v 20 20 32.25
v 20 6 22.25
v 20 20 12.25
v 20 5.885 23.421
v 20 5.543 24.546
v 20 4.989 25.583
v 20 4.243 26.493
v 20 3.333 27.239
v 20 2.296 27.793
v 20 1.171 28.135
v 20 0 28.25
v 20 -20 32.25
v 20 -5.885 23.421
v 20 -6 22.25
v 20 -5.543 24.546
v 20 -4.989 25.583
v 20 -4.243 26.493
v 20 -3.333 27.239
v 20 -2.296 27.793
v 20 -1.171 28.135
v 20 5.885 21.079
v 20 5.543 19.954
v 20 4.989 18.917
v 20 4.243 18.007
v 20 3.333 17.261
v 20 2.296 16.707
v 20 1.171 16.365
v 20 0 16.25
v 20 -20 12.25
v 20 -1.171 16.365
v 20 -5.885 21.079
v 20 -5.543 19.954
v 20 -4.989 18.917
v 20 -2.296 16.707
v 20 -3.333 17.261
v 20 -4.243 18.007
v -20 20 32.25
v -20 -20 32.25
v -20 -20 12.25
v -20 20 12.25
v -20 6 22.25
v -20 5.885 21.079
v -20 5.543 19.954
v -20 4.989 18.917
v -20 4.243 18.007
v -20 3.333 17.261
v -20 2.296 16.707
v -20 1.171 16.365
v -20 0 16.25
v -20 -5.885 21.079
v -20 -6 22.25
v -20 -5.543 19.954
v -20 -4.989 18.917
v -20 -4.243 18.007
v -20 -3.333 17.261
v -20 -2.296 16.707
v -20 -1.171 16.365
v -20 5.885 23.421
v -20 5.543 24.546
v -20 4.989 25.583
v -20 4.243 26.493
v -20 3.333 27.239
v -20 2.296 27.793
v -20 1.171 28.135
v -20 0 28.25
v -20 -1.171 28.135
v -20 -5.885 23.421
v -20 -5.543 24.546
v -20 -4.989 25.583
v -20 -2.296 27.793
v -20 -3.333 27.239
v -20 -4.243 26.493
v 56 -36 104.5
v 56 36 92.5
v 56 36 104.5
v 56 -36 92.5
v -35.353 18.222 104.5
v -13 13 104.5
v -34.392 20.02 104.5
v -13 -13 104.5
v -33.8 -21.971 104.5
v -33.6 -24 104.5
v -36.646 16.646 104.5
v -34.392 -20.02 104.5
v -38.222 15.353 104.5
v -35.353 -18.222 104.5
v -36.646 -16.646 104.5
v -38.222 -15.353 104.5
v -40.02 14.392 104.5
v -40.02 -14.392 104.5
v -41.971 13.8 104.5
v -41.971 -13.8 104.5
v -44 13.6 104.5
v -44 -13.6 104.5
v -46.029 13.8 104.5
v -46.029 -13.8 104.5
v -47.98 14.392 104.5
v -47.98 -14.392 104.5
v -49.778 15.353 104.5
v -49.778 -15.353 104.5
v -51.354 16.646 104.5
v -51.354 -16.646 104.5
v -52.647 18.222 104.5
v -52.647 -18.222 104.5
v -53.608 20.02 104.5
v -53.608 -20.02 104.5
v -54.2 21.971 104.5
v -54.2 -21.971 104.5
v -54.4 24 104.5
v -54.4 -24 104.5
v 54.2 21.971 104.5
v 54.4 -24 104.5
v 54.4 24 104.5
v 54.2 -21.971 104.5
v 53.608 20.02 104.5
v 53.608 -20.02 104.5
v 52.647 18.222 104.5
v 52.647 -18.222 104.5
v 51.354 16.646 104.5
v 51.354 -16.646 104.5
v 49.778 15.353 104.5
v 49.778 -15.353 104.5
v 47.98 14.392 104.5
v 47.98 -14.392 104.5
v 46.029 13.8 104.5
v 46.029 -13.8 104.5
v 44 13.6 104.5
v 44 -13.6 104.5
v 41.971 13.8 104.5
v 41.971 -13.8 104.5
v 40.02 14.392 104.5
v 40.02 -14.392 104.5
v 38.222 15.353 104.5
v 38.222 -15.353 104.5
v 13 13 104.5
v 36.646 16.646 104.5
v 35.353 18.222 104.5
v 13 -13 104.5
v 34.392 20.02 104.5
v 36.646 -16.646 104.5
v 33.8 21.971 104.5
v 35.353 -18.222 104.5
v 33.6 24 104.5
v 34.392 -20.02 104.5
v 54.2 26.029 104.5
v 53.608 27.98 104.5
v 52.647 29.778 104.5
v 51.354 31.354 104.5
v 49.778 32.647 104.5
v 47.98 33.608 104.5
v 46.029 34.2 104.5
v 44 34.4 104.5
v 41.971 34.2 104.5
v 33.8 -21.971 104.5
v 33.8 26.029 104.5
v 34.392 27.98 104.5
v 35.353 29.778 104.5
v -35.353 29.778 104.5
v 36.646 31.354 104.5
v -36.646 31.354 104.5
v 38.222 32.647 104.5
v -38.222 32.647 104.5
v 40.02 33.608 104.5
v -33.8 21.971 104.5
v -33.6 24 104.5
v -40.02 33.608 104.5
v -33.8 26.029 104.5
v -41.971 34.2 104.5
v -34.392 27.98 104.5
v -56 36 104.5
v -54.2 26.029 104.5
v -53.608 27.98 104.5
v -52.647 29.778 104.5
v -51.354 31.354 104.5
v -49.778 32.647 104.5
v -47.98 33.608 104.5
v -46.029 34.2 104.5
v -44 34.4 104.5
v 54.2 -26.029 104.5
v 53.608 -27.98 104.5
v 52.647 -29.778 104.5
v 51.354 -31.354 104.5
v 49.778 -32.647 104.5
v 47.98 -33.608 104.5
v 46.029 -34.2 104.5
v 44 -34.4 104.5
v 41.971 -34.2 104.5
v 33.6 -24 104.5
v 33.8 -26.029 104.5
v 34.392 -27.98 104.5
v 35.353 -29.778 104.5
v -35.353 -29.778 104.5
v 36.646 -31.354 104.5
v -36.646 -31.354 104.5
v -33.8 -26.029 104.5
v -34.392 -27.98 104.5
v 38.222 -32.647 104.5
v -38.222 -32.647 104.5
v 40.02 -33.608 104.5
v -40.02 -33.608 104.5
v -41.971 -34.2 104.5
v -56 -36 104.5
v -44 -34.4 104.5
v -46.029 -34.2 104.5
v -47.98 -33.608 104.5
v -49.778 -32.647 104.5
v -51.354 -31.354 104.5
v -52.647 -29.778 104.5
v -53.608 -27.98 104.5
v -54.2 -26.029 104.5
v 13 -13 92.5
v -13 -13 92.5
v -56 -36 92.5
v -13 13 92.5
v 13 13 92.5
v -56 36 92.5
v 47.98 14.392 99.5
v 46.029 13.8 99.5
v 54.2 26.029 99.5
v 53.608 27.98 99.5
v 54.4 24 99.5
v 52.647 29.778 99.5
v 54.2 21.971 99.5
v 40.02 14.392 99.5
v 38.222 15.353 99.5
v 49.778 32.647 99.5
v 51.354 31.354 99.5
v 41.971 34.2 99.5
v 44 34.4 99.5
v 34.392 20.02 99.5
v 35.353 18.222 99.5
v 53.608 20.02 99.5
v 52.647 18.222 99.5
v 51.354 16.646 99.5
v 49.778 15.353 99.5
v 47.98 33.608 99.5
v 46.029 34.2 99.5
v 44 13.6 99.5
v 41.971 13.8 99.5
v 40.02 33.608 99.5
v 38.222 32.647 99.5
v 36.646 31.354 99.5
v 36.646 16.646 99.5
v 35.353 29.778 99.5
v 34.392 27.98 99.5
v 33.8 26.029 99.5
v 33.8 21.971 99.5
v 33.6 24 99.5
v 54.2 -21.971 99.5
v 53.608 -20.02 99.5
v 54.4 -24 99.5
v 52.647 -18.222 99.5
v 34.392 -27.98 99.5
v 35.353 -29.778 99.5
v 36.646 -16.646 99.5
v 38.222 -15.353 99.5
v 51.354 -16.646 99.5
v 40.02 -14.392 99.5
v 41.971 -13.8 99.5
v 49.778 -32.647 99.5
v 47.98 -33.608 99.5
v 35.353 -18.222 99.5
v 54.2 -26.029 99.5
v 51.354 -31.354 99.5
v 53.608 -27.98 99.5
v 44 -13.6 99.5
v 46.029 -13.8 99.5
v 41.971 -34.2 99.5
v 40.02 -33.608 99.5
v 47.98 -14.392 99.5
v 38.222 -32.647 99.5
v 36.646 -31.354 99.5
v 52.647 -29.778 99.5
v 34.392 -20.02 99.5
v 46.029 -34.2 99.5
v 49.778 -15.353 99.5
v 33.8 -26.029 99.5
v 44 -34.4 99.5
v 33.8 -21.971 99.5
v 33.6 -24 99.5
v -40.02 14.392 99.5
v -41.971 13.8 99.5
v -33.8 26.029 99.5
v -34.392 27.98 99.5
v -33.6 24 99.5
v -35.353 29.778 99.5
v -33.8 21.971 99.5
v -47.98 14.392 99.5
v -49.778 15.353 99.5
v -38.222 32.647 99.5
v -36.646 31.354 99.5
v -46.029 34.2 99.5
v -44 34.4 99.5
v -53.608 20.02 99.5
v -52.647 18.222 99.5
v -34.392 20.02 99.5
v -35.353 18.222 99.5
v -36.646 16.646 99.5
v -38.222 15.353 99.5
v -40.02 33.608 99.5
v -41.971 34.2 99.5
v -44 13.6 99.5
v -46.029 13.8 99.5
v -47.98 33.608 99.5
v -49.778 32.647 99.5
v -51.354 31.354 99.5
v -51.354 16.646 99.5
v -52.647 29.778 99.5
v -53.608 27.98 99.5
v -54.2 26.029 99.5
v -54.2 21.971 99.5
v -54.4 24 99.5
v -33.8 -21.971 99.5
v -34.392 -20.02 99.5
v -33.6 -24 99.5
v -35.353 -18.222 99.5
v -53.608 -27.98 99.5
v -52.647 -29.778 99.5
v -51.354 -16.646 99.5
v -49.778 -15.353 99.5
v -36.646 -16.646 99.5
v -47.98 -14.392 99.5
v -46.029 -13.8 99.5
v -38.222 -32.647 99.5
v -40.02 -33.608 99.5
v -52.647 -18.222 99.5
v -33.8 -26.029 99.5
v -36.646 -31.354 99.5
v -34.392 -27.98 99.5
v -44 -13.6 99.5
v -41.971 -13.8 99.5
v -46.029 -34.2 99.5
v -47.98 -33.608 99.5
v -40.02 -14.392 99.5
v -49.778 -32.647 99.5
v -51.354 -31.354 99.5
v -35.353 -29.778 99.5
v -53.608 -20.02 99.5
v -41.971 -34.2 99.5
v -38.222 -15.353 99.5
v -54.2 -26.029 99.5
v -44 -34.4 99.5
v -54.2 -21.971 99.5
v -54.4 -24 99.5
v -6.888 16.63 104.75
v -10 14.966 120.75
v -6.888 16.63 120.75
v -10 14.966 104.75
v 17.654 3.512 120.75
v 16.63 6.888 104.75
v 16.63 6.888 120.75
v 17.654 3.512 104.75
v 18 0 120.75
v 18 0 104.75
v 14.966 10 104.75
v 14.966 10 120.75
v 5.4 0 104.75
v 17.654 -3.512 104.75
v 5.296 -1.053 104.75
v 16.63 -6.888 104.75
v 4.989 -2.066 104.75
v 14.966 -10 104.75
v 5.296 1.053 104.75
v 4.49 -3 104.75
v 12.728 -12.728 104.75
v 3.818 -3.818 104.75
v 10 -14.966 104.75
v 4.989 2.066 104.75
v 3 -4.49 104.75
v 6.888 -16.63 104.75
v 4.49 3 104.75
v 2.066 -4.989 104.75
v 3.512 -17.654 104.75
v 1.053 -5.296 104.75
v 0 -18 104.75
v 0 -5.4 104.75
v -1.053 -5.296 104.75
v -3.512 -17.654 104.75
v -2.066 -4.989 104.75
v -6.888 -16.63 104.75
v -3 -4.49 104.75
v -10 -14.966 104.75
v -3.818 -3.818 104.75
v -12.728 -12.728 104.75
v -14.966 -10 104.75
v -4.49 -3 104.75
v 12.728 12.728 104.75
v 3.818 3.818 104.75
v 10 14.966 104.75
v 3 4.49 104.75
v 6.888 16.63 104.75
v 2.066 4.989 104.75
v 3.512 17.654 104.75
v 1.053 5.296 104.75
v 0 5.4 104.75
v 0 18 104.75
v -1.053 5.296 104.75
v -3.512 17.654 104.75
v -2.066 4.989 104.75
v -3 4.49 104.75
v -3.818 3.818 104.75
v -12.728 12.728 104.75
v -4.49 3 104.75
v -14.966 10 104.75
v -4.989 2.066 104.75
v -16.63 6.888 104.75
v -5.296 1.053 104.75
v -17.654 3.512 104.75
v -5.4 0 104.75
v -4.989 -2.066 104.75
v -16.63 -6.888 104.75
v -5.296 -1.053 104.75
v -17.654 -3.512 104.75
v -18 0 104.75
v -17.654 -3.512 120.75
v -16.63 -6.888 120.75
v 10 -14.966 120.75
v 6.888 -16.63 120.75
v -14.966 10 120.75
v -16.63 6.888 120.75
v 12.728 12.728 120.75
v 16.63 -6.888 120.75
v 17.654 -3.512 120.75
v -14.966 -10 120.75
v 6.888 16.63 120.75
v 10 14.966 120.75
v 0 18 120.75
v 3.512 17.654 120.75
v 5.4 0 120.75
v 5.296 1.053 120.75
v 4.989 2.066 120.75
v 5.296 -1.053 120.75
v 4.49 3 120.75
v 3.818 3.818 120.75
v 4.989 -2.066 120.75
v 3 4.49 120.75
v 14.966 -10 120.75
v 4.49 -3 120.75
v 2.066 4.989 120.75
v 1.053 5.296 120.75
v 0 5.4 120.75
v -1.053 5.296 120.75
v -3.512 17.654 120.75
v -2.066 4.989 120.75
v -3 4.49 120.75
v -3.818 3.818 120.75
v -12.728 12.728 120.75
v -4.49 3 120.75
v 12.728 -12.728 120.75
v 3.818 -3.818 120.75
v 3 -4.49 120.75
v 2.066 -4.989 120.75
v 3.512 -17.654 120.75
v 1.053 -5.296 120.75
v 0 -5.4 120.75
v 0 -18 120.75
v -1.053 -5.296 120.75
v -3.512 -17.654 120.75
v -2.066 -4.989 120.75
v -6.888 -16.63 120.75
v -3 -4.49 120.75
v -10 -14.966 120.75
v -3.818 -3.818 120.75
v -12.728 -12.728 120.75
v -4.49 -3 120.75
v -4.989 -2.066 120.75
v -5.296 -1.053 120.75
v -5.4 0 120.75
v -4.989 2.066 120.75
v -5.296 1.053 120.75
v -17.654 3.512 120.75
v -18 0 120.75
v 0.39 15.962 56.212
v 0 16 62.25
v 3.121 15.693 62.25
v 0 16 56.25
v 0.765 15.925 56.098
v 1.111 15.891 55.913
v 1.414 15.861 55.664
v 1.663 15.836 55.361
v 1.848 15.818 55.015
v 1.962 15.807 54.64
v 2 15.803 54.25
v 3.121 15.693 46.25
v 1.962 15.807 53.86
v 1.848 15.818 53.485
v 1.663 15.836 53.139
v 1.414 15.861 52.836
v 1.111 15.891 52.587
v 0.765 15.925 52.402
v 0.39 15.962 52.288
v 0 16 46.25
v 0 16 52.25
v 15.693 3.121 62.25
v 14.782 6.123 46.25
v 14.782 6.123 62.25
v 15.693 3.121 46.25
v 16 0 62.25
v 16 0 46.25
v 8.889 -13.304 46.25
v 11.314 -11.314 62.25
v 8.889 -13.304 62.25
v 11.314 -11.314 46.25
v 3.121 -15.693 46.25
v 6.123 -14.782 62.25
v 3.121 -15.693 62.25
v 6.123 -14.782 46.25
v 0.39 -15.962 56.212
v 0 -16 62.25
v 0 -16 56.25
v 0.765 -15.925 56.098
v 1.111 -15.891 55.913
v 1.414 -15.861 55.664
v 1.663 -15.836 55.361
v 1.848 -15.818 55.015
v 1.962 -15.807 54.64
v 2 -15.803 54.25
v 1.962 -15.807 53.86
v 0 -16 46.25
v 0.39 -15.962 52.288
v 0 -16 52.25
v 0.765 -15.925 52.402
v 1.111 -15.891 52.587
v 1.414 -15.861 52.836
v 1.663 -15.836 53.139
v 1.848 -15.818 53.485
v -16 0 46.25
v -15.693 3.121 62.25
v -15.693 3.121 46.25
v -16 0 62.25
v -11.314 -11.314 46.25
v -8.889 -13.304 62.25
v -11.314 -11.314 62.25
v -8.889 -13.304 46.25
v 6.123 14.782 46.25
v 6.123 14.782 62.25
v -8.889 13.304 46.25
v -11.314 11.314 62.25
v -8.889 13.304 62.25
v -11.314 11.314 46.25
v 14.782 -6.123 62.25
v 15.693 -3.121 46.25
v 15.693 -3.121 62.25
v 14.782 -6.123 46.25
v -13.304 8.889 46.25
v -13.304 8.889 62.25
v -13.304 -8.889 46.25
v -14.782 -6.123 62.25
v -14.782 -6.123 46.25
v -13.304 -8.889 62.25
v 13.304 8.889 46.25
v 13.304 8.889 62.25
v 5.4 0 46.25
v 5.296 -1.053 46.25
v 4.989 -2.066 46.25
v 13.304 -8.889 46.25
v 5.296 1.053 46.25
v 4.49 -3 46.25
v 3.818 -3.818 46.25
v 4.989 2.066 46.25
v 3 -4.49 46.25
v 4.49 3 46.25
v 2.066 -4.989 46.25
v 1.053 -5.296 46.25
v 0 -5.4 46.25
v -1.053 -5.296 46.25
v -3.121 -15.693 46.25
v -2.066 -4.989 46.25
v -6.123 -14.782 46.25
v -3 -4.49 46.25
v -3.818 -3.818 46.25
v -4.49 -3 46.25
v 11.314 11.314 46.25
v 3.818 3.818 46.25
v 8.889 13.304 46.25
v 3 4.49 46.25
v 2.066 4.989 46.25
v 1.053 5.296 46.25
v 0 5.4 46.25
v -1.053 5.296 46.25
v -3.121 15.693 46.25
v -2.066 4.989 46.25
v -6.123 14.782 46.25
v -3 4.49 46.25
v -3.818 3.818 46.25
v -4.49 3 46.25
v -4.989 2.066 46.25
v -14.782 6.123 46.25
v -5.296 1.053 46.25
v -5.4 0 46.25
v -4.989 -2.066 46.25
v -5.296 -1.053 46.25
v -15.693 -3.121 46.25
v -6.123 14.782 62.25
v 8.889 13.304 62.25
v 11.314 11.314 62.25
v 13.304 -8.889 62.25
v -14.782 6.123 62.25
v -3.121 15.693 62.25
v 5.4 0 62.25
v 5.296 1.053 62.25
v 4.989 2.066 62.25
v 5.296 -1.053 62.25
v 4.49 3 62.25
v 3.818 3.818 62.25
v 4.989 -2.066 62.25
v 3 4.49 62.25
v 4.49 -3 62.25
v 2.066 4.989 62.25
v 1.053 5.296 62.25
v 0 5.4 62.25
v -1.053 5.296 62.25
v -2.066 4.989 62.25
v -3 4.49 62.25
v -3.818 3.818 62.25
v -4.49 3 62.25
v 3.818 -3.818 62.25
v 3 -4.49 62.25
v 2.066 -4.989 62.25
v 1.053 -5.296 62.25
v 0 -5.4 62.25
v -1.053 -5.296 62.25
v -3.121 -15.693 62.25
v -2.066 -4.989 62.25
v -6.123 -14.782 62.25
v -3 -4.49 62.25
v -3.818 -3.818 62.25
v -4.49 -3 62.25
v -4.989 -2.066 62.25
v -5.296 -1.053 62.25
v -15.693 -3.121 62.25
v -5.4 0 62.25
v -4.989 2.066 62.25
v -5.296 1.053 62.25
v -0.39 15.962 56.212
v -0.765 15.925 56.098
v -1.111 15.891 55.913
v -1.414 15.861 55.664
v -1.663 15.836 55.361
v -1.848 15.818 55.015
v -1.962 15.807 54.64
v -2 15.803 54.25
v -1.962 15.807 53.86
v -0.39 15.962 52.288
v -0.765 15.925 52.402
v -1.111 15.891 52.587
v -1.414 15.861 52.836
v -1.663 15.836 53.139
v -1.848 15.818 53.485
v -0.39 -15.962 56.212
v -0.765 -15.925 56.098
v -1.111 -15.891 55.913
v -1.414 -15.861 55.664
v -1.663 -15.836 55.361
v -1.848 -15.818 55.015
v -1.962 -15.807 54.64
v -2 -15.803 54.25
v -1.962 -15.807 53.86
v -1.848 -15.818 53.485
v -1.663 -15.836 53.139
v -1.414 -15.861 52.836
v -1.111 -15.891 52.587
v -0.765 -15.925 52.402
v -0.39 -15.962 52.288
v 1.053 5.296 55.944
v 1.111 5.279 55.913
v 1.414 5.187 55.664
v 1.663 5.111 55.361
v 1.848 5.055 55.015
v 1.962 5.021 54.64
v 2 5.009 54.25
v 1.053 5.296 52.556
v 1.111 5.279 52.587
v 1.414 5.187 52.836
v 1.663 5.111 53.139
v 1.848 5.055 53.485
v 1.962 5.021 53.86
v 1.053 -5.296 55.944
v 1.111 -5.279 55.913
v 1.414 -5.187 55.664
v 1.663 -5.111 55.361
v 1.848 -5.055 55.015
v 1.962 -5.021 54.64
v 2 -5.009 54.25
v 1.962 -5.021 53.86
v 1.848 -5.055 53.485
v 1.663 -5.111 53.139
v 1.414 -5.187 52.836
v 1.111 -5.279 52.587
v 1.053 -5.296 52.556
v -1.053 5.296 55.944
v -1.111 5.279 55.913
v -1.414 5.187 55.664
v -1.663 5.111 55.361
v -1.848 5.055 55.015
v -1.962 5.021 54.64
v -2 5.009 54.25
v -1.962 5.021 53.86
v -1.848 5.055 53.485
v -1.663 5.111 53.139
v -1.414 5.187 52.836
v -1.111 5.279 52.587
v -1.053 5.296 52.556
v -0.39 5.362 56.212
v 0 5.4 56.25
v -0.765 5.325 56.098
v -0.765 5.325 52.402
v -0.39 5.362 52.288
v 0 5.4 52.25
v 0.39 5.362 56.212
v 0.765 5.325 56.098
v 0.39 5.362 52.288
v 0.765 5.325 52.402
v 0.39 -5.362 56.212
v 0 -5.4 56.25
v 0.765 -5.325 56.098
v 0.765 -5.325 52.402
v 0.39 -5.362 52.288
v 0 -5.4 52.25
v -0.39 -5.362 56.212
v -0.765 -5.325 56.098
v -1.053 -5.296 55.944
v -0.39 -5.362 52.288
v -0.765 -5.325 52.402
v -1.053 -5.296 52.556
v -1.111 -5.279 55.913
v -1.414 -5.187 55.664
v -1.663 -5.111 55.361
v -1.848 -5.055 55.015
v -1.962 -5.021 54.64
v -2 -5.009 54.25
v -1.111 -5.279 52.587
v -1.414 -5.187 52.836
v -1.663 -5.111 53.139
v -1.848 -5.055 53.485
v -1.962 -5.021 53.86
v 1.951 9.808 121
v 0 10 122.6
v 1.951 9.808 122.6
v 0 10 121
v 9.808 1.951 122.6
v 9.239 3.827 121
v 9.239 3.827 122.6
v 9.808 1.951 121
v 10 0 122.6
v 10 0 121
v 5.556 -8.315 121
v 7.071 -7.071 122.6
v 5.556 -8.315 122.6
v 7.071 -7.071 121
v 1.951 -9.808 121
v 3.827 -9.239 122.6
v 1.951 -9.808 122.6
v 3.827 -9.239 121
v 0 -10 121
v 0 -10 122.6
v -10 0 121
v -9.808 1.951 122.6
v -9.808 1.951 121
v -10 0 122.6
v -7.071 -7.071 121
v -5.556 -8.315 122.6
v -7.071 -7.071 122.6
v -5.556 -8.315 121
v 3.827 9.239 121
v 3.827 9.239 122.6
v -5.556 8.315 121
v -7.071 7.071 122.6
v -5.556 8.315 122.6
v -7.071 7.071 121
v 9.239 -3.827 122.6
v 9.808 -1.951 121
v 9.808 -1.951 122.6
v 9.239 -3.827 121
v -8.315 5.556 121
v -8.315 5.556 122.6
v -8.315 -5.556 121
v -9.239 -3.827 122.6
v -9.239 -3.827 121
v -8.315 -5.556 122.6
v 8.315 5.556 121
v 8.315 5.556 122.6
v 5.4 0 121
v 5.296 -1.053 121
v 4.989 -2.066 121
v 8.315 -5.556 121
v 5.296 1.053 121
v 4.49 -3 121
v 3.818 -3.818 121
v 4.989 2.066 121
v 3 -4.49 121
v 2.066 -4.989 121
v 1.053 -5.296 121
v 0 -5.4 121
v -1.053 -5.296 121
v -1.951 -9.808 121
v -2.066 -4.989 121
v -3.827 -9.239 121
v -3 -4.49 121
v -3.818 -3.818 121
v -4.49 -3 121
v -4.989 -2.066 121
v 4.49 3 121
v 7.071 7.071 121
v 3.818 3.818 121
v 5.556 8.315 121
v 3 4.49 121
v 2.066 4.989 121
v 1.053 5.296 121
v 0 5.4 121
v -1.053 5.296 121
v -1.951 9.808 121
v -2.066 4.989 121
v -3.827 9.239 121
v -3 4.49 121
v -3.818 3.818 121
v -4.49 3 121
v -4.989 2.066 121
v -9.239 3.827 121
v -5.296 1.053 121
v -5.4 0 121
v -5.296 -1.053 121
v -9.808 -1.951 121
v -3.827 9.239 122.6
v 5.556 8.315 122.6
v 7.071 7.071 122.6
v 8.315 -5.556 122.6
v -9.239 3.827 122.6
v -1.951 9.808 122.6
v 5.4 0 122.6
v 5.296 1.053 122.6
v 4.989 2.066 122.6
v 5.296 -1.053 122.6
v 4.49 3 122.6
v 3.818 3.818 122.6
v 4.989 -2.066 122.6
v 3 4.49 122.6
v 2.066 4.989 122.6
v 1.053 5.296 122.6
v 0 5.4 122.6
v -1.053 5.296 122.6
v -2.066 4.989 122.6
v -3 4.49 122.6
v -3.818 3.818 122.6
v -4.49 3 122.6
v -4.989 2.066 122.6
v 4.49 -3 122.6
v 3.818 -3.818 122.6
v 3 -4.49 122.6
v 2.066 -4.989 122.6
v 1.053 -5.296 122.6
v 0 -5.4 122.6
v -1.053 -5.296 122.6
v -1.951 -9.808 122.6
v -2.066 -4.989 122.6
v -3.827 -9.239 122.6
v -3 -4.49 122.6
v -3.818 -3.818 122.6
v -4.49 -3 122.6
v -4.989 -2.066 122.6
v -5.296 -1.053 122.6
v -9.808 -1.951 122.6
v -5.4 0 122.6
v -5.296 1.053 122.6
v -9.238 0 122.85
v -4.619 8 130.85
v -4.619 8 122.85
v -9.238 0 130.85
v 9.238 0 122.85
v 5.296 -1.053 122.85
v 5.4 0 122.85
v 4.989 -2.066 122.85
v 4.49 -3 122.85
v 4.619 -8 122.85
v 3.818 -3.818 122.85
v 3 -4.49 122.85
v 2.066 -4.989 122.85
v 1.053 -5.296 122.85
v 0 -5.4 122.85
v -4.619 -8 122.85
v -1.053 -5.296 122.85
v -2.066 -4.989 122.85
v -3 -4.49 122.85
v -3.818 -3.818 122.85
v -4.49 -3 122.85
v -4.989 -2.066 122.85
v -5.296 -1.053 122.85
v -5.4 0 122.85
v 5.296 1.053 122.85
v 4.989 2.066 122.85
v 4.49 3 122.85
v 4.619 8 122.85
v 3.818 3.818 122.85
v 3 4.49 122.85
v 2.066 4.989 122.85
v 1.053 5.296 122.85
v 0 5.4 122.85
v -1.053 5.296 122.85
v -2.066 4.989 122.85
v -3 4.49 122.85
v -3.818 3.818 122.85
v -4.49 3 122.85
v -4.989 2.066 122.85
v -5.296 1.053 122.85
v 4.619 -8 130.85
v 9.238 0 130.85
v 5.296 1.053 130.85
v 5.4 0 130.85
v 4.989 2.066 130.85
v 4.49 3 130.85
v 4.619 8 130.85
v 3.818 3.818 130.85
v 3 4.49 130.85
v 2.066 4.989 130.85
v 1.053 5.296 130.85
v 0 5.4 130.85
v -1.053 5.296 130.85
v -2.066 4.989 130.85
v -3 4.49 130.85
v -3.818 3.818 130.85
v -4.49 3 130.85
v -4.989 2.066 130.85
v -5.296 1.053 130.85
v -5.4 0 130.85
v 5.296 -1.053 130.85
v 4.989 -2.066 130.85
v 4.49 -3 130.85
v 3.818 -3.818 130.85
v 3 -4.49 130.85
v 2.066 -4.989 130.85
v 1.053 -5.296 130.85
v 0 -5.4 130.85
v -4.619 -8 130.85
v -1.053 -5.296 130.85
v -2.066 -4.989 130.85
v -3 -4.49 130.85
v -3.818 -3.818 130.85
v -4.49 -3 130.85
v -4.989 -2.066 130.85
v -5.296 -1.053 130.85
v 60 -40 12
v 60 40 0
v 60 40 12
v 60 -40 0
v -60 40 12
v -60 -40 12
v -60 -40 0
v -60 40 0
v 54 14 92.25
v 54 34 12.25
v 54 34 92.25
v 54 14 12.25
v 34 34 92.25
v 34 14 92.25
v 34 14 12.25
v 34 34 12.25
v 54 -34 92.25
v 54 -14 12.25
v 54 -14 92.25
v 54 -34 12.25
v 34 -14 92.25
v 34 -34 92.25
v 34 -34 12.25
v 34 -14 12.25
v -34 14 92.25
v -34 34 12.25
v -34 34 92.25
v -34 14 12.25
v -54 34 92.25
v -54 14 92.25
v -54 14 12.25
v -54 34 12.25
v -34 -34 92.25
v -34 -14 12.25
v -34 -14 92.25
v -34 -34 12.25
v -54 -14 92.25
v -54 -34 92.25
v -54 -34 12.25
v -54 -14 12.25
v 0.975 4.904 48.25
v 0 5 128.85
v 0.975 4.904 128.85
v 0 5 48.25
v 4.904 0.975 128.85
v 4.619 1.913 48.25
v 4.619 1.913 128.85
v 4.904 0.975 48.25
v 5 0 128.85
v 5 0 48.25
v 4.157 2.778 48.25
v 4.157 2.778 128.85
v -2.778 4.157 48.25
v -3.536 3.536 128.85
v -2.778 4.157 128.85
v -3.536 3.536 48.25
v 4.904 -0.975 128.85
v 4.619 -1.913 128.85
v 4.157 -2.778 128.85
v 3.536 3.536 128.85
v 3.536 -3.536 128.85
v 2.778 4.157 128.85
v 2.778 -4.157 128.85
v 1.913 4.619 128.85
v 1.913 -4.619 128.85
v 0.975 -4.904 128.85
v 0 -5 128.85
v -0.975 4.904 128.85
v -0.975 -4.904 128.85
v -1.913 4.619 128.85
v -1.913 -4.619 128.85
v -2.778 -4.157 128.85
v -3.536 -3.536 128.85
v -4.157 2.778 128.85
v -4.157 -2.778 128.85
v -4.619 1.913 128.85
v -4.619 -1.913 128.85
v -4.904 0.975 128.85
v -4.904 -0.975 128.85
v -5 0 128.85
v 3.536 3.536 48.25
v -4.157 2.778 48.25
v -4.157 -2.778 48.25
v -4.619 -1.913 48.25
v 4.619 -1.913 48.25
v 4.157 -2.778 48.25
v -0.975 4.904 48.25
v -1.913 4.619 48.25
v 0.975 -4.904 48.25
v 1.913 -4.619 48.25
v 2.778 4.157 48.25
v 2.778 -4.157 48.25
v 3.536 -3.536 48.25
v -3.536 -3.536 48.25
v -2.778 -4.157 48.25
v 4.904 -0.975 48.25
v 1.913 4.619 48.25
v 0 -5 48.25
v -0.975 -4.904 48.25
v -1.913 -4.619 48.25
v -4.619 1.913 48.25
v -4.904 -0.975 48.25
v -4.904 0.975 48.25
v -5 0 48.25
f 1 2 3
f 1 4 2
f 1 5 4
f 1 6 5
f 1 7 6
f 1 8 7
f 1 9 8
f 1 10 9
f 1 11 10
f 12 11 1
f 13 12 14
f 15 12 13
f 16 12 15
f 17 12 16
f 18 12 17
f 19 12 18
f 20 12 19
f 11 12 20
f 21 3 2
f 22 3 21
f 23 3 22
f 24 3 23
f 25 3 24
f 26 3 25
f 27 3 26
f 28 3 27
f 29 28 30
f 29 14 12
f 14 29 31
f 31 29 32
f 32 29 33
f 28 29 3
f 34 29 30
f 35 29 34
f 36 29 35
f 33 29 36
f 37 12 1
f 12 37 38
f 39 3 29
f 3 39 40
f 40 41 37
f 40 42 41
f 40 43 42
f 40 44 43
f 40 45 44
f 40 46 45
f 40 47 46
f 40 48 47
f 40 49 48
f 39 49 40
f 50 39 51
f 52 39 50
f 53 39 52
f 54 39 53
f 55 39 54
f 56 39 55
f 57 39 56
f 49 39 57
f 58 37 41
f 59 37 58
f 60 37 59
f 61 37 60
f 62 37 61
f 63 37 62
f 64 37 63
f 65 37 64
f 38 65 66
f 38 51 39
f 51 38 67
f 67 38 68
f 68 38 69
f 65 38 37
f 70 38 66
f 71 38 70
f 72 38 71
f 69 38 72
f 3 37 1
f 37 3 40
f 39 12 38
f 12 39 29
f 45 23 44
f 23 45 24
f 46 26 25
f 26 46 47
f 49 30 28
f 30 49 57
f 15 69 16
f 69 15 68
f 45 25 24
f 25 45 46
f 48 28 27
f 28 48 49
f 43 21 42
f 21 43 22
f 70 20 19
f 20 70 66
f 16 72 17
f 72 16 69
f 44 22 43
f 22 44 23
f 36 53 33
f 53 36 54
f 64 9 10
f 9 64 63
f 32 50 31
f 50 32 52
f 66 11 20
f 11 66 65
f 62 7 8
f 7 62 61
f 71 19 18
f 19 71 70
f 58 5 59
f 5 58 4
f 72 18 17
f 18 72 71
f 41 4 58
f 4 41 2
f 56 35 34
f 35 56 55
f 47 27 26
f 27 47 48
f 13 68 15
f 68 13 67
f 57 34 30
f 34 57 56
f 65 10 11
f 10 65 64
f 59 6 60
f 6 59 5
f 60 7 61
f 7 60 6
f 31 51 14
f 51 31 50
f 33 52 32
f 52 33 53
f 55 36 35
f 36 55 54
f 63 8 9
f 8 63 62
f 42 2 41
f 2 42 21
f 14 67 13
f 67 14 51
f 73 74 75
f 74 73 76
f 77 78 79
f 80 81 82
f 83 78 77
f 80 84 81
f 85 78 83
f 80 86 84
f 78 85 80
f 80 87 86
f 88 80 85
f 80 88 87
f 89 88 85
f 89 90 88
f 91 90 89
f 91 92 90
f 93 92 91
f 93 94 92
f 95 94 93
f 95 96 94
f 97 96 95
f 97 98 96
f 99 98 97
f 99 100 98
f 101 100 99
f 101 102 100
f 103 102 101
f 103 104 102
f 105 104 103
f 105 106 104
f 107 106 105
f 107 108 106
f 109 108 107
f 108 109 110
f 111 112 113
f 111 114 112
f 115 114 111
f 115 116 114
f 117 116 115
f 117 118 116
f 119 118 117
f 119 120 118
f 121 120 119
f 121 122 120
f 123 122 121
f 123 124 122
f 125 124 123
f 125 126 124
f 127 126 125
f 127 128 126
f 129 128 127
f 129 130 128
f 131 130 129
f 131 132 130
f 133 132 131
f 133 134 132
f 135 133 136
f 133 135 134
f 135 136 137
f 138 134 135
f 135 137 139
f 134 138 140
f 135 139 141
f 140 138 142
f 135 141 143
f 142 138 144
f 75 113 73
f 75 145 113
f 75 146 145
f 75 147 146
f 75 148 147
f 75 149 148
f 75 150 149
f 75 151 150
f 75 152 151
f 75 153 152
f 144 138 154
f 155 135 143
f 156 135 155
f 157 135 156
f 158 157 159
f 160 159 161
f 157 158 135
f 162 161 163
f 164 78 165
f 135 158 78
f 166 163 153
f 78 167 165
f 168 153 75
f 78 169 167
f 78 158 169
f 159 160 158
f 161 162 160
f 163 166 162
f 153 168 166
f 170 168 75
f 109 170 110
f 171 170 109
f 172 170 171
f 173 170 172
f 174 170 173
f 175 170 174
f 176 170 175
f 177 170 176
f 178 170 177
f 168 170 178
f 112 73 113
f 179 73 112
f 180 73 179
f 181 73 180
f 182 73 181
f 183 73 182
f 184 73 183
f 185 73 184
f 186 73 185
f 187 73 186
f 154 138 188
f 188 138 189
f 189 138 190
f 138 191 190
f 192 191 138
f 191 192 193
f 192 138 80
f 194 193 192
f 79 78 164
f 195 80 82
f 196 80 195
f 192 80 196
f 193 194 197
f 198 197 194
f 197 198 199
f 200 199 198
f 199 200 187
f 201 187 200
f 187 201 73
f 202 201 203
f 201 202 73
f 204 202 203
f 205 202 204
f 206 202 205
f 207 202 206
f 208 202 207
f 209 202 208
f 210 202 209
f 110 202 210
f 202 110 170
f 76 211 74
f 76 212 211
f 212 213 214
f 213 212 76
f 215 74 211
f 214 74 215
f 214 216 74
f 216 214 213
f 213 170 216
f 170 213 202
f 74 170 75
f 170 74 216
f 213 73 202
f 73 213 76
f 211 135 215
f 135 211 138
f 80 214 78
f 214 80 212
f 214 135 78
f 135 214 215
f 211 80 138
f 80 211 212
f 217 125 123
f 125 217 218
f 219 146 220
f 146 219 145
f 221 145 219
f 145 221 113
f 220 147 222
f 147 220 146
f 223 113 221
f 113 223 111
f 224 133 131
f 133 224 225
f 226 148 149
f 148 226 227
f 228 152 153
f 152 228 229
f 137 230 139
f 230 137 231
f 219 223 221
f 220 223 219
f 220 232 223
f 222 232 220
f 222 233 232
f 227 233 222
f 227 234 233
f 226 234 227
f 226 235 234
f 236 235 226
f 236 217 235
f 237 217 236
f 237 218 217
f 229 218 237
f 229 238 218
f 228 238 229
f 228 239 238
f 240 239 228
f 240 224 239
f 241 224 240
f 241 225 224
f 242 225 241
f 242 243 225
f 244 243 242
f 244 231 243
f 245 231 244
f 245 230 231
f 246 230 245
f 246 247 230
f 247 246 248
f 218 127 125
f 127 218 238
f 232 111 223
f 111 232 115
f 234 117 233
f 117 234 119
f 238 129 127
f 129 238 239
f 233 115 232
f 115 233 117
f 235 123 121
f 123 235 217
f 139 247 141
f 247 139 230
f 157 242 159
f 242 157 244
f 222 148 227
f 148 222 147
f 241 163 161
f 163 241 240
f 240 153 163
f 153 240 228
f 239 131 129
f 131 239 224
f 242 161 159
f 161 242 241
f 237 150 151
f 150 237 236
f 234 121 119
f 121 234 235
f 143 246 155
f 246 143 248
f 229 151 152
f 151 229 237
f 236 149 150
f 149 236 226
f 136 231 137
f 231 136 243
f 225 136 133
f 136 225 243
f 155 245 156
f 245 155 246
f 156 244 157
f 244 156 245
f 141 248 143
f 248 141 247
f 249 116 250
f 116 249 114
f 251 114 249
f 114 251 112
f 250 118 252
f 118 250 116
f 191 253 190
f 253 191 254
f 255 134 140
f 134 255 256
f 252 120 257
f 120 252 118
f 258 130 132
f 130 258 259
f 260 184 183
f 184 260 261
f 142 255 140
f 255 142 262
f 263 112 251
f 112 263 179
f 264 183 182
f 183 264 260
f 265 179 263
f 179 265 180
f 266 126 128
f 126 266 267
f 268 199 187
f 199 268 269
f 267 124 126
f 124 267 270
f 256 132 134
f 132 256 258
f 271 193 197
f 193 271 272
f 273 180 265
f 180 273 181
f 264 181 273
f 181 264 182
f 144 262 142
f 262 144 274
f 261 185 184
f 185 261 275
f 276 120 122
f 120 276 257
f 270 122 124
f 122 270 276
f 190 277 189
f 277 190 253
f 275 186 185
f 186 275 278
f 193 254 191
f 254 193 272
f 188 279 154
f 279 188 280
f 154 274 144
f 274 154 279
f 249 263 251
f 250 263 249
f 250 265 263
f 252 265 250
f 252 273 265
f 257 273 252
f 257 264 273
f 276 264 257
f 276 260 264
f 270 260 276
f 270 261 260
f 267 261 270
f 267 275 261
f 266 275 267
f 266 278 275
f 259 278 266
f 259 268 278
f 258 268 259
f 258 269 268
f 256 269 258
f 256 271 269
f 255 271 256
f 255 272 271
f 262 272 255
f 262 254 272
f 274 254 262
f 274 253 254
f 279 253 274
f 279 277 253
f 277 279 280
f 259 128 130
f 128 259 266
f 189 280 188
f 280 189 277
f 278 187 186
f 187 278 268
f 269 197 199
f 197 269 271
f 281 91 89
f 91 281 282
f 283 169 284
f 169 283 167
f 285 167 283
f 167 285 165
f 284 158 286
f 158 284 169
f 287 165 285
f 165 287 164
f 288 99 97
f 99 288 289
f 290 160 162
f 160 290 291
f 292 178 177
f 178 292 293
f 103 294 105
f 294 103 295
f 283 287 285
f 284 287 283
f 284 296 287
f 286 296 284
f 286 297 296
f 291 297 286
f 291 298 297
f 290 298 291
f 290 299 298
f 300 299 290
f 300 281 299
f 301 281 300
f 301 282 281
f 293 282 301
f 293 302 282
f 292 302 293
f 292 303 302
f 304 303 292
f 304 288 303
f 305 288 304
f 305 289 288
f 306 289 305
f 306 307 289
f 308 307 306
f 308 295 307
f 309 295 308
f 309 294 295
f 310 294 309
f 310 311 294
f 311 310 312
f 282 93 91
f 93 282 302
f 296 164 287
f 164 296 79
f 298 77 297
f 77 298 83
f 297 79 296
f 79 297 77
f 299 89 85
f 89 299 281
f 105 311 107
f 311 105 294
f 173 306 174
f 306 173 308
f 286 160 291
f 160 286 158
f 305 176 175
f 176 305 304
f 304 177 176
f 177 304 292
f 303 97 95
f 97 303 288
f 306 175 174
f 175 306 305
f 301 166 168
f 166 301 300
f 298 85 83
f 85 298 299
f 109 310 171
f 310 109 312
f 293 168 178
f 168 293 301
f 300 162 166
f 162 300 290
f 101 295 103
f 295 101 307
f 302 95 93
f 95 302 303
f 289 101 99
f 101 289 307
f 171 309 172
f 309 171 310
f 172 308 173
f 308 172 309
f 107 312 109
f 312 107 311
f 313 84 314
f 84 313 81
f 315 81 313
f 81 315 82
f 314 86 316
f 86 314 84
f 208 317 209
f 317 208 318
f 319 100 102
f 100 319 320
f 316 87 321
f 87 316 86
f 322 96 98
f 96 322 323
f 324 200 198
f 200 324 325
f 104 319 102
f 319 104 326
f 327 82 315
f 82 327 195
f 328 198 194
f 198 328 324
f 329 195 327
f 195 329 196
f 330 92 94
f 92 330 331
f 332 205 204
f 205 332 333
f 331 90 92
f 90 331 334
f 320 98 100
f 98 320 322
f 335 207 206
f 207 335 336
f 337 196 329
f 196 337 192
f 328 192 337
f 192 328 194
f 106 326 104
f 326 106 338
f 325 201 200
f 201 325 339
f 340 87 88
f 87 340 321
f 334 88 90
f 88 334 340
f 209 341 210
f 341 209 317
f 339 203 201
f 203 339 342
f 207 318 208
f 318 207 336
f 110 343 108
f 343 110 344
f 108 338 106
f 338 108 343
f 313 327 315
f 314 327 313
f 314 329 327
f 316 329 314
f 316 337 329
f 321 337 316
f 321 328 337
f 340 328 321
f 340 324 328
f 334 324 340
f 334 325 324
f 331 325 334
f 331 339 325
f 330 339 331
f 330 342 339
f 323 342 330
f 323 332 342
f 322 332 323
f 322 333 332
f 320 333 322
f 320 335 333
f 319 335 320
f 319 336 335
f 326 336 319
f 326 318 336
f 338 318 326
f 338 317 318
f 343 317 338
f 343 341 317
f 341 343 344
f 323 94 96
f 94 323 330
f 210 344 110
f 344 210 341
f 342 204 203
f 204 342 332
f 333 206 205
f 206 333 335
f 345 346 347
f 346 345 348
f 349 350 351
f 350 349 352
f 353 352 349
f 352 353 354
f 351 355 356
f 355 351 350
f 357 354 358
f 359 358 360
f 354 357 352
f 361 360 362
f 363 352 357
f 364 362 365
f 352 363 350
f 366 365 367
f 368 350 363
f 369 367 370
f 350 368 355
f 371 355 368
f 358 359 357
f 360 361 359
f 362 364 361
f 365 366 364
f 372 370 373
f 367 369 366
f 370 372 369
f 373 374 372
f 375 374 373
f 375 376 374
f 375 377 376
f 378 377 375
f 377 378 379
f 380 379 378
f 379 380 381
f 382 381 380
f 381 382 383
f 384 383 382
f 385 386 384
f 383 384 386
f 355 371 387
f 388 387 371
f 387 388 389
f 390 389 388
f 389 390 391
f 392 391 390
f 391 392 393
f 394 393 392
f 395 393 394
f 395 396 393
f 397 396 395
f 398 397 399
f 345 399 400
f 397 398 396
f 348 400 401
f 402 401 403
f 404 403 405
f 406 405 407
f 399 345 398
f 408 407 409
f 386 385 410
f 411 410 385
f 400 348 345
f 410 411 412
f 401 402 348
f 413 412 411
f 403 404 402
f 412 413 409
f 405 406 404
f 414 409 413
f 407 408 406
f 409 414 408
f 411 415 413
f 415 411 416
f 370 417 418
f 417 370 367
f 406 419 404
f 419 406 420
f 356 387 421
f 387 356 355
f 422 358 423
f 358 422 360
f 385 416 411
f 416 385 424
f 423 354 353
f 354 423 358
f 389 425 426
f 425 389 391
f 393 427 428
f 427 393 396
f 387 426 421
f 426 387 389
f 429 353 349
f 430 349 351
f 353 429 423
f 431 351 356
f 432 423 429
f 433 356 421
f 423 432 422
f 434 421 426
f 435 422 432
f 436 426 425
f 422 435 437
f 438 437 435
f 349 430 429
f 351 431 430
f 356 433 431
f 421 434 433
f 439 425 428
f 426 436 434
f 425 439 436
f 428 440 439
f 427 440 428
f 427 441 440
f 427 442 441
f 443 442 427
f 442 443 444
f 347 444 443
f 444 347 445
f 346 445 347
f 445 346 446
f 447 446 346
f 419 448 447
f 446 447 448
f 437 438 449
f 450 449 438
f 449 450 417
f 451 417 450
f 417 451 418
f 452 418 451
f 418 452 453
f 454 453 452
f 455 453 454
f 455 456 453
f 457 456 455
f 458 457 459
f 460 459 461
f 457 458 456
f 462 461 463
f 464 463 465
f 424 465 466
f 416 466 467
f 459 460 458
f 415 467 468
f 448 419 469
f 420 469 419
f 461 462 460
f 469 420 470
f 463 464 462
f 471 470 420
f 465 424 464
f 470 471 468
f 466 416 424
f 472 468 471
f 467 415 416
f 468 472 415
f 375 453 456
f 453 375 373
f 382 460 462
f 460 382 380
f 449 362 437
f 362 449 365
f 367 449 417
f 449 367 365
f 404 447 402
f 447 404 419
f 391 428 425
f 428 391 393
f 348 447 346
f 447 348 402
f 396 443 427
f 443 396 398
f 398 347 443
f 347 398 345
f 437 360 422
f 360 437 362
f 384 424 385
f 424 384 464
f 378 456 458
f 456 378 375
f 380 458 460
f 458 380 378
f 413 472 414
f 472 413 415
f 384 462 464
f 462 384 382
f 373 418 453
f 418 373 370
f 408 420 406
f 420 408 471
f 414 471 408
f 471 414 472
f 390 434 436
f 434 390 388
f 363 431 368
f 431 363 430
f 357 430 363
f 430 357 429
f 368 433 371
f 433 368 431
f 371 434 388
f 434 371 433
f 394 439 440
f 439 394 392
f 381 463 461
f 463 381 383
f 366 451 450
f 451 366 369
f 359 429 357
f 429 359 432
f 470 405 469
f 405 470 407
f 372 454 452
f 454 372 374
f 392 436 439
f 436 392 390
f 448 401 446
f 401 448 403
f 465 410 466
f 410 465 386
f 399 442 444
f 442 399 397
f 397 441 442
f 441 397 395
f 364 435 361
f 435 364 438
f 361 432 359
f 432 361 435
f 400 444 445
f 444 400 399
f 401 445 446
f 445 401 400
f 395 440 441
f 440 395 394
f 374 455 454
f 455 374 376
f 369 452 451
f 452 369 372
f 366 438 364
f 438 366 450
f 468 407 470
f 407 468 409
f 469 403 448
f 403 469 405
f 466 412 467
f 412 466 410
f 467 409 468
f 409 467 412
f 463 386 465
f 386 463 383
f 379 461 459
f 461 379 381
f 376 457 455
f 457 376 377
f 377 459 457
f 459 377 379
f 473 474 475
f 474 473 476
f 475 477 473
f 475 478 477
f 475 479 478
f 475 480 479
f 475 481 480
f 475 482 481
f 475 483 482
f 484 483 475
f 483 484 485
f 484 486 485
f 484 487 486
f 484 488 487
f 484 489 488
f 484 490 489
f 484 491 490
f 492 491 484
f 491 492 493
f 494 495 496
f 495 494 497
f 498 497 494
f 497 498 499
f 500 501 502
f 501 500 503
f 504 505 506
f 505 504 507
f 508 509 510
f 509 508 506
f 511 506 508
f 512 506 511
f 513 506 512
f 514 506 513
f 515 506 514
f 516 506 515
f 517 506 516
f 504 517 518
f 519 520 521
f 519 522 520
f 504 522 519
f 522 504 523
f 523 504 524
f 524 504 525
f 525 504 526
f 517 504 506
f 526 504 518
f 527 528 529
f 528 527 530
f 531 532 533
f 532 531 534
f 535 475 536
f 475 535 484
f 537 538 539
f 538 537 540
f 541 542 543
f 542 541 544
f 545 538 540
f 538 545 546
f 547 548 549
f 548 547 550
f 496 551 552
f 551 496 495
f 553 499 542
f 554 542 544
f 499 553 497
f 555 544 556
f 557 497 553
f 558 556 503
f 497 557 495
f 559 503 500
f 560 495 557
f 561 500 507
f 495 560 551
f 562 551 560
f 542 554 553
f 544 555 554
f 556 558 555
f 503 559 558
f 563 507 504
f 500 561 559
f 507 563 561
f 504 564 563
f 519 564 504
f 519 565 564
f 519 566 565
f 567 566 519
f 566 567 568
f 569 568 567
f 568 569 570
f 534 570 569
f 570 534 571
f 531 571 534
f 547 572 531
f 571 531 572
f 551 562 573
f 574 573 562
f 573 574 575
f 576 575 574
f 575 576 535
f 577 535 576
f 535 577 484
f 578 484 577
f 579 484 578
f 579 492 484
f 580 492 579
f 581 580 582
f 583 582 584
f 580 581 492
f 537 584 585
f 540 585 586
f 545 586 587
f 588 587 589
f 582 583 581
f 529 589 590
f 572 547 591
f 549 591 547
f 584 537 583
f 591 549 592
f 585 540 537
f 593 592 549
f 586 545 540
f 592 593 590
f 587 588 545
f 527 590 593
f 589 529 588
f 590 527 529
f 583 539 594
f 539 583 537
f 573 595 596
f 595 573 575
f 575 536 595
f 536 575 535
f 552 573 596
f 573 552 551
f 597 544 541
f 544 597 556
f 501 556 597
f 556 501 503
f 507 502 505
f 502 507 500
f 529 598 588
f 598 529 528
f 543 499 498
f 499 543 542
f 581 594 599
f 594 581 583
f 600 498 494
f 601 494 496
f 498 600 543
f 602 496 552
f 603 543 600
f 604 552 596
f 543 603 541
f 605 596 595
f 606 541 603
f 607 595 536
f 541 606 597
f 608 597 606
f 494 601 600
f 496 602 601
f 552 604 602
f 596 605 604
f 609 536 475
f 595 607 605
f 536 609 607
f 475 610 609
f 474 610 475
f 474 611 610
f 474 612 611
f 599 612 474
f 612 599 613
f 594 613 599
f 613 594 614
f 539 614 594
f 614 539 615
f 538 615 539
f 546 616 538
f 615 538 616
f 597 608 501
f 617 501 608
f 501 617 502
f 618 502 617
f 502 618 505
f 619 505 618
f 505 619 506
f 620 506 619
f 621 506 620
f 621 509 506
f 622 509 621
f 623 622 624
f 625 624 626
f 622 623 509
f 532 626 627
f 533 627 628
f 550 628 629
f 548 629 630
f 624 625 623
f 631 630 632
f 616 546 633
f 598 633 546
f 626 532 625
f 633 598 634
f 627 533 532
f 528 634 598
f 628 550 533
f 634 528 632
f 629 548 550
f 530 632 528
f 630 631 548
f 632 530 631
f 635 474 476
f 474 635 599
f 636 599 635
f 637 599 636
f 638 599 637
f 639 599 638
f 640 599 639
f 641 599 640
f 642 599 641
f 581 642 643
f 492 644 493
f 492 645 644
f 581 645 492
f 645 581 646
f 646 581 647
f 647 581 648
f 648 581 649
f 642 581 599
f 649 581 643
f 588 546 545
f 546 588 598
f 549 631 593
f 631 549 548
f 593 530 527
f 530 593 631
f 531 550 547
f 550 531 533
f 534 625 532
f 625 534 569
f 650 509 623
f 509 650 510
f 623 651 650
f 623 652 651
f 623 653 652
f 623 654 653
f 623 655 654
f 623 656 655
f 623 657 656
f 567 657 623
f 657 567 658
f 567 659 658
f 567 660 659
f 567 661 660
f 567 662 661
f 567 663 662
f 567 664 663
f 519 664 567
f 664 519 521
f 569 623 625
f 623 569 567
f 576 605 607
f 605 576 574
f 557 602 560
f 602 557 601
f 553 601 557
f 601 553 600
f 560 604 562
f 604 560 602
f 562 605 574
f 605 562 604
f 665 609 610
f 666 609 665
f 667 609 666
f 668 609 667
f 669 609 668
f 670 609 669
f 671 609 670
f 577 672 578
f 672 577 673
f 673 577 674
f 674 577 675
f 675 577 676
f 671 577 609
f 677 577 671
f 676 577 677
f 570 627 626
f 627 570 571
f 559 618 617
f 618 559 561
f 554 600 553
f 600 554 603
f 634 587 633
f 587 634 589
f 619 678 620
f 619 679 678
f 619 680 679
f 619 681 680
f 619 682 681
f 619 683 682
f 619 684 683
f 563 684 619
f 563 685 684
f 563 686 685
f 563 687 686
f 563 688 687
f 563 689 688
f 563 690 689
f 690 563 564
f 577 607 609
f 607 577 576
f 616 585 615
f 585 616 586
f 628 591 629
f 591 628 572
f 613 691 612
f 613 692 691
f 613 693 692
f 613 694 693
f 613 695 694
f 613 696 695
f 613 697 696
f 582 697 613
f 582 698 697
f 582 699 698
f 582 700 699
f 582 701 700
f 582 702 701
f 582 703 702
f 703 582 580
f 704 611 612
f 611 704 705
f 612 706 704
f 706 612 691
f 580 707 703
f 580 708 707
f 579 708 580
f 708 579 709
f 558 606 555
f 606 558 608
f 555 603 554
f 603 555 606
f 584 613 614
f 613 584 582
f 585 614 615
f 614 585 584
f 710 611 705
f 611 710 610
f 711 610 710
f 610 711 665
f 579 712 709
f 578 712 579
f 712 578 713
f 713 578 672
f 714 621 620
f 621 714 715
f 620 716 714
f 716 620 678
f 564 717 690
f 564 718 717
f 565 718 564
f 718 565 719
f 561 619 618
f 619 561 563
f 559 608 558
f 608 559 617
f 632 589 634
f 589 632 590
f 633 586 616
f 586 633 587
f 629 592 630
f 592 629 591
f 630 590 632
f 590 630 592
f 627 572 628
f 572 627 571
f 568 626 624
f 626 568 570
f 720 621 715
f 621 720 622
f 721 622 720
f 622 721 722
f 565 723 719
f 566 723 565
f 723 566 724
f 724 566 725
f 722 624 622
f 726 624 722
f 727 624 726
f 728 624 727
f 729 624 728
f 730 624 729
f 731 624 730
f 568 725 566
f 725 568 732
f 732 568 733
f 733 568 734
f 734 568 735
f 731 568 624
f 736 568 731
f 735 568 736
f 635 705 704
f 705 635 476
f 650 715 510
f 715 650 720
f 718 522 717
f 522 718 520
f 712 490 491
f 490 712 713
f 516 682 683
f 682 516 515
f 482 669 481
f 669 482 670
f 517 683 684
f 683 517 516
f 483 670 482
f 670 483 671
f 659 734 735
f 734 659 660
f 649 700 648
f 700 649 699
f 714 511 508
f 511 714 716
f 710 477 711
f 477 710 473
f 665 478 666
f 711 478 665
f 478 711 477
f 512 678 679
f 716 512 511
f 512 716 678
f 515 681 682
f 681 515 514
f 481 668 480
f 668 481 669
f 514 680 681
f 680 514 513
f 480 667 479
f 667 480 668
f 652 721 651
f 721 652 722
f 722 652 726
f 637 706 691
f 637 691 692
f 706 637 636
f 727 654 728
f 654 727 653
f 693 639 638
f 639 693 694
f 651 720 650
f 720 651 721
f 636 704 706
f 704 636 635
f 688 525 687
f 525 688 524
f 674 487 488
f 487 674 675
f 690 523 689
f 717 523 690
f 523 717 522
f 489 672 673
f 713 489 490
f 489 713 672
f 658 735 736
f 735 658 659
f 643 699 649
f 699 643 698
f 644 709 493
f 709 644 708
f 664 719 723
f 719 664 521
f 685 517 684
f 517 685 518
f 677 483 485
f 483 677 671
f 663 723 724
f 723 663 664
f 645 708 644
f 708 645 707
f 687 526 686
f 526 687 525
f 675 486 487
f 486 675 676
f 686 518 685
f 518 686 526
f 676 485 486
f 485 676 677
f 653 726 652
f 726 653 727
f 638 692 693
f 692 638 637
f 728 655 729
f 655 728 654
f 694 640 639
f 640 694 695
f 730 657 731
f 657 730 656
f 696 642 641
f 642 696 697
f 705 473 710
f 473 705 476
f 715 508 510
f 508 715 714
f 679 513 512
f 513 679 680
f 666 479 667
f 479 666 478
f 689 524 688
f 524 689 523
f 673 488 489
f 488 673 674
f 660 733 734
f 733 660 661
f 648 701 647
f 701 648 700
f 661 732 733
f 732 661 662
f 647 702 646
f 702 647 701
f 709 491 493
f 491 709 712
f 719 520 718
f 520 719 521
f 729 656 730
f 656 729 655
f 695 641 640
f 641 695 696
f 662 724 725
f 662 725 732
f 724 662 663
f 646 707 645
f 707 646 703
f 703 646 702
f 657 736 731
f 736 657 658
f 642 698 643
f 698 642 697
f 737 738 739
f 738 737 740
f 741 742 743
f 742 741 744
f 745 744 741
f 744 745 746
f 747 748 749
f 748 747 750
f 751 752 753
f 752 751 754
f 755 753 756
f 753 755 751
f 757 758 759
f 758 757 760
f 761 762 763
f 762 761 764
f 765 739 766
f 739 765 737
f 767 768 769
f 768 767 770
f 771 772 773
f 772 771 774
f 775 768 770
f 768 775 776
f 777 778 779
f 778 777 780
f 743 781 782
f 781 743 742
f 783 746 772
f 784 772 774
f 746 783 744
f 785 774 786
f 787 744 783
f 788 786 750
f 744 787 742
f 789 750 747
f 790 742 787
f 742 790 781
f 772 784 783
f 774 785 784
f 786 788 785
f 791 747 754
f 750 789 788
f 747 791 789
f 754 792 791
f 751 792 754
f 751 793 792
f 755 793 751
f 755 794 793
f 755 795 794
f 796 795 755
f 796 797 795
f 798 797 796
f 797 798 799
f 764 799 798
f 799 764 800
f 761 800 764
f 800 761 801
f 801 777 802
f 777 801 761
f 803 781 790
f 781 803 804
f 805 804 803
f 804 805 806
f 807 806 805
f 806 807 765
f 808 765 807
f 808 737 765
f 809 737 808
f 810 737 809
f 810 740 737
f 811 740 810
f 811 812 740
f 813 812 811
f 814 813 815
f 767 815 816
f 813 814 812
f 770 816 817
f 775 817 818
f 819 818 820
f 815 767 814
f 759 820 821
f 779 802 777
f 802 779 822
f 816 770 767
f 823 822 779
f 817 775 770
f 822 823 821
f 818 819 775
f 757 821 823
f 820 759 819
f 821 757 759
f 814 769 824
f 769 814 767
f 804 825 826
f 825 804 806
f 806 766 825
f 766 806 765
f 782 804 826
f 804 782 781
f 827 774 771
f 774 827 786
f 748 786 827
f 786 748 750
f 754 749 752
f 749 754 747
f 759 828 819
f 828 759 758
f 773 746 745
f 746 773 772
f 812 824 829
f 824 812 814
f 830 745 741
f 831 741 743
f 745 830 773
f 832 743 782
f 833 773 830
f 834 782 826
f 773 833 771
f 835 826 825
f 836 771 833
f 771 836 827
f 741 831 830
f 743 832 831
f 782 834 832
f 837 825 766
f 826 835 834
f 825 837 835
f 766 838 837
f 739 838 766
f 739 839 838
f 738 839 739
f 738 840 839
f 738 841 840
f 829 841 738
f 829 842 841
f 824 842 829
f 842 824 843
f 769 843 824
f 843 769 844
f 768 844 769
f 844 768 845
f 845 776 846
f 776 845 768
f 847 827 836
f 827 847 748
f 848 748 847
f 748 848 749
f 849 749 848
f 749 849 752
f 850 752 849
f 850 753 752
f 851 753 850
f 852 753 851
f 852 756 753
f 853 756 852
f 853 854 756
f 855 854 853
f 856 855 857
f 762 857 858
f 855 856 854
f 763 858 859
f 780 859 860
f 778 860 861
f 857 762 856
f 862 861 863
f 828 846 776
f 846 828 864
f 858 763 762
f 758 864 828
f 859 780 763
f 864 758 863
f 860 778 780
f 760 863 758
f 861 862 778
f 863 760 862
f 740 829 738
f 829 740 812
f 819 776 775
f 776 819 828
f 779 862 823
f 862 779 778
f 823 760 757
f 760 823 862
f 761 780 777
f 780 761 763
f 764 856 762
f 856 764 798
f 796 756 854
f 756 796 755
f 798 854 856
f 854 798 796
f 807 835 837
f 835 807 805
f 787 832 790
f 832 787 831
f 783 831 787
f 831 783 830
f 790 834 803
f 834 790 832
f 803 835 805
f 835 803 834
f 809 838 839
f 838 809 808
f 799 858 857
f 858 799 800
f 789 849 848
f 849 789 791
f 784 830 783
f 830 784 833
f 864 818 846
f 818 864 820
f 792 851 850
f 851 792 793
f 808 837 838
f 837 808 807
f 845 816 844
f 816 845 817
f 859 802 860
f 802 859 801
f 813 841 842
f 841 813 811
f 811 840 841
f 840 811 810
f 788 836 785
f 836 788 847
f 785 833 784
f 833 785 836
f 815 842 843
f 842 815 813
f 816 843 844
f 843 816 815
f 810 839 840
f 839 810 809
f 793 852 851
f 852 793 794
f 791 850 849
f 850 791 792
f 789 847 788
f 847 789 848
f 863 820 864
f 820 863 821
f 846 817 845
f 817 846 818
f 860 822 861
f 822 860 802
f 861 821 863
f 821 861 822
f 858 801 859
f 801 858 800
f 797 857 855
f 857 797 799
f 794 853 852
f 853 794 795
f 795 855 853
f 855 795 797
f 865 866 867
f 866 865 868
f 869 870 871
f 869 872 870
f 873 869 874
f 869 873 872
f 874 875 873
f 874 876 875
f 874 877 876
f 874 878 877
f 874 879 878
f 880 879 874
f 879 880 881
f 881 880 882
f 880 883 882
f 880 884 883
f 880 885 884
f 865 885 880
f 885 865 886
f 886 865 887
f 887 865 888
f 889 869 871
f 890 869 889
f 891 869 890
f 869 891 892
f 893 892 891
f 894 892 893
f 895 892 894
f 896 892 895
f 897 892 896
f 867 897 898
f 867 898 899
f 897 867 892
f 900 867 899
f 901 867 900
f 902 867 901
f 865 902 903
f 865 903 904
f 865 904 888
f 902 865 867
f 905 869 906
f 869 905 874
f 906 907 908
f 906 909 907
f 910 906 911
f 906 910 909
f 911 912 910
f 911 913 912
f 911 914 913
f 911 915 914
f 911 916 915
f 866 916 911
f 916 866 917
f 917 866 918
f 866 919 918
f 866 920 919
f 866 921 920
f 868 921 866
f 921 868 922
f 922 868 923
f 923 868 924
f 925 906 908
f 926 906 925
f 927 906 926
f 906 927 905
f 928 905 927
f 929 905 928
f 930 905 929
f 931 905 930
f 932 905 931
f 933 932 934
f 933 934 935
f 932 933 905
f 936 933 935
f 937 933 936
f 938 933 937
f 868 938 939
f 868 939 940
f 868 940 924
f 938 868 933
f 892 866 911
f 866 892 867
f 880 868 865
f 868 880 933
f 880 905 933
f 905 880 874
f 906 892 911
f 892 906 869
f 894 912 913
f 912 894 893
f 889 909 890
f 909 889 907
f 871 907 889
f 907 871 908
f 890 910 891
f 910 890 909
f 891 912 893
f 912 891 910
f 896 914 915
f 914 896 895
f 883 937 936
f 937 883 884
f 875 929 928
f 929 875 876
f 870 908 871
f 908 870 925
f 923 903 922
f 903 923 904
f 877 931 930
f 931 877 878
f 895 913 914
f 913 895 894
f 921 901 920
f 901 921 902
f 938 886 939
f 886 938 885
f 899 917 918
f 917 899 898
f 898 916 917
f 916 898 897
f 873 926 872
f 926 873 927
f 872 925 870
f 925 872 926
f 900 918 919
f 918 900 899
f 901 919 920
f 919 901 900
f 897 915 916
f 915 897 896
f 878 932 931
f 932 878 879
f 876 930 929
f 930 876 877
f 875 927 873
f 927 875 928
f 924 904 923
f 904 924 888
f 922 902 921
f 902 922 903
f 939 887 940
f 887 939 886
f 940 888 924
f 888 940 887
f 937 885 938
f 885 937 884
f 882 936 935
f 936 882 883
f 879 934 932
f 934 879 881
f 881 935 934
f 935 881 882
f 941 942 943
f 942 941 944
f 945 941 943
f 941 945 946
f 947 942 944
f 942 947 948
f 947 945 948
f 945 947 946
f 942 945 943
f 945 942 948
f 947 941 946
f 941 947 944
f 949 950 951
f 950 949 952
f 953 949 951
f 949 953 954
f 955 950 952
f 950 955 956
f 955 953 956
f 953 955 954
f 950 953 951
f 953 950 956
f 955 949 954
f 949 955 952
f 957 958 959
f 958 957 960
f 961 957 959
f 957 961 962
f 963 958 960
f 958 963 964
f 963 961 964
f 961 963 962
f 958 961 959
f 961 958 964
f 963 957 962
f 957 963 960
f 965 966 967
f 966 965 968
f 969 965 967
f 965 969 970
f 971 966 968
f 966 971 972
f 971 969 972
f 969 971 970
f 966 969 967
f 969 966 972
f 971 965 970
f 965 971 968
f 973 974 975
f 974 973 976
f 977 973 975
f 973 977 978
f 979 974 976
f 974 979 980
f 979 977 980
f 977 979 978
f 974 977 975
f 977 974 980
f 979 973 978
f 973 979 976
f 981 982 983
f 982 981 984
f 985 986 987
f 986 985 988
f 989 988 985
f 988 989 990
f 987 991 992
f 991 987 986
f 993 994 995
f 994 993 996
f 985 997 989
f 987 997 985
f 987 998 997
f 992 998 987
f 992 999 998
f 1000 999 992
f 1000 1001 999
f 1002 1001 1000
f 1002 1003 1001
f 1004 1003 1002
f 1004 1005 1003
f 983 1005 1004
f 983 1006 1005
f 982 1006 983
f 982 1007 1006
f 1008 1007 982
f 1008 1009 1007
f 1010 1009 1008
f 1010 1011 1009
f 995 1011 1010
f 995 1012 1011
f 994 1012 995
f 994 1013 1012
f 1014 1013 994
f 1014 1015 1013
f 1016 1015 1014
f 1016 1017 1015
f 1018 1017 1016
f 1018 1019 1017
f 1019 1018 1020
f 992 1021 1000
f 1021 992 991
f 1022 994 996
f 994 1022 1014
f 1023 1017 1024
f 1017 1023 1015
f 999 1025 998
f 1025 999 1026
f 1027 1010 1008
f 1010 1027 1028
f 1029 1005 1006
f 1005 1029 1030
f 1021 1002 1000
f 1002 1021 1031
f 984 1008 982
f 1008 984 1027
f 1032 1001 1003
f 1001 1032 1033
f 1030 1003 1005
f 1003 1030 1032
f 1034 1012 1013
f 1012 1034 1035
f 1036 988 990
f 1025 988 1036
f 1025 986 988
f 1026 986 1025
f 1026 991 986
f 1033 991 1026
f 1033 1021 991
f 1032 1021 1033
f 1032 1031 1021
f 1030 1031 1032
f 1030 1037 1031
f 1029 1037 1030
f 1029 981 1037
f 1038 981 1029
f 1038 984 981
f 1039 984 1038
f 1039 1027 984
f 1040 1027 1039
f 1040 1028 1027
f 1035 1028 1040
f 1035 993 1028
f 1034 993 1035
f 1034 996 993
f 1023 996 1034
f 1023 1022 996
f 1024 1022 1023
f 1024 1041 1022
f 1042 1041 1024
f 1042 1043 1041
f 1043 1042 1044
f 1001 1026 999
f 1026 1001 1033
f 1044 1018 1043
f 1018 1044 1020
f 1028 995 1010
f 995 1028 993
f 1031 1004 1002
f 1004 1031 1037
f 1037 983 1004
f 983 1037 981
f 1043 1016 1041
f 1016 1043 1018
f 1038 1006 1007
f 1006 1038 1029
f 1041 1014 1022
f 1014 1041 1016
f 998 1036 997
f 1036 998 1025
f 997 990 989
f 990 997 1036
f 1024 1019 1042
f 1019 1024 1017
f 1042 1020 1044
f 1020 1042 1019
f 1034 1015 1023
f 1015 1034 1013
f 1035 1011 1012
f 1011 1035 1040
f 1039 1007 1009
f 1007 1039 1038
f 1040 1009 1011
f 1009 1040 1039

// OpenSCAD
$fn = 32;

// ------------------------------------------------------------------------
// Arbor press fixture: screw d10, posts 80 mm, gap 14 mm
// Every part is its own module, assembly() places every instance.
// ------------------------------------------------------------------------

// --- part 1 ---
module press_bed() {
  difference() {
    translate([-60, -40, 0]) cube([120, 80, 12]);
  }
}

// --- part 2 ---
module anvil_block() {
  difference() {
    translate([-20, -20, 0]) cube([40, 40, 20]);
    translate([0, 0, 10]) rotate([0, 90, 0]) cylinder(h = 42, d = 12, center = true);
  }
}

// --- part 3 ---
module press_post_a() {
  translate([-10, -10, 0]) cube([20, 20, 80]);
}

// --- part 4 ---
module press_post_b() {
  translate([-10, -10, 0]) cube([20, 20, 80]);
}

// --- part 5 ---
module press_post_c() {
  translate([-10, -10, 0]) cube([20, 20, 80]);
}

// --- part 6 ---
module press_post_d() {
  translate([-10, -10, 0]) cube([20, 20, 80]);
}

// --- part 7 ---
module press_frame() {
  difference() {
    translate([-56, -36, 0]) cube([112, 72, 12]);
    translate([-13, -13, -1]) cube([26, 26, 14]);
    translate([44, 24, 7]) cylinder(h = 6, d = 20.8);
    translate([44, -24, 7]) cylinder(h = 6, d = 20.8);
    translate([-44, 24, 7]) cylinder(h = 6, d = 20.8);
    translate([-44, -24, 7]) cylinder(h = 6, d = 20.8);
  }
}

// --- part 8 ---
module guide_ring() {
  difference() {
      translate([0, 0, 0]) cylinder(h = 16, d = 36);
      translate([0, 0, -1]) cylinder(h = 18, d = 10.8);
    }
}

// --- part 9 ---
module press_screw() {
  translate([0, 0, -40.3]) cylinder(h = 80.6, d = 10);
}

// --- part 10 ---
module press_head() {
  difference() {
    cylinder(h = 16, d = 32);
    translate([0, 0, -1]) cylinder(h = 18, d = 10.8);
    translate([0, 0, 8]) rotate([90, 0, 0]) cylinder(h = 34, d = 4, center = true);
  }
}

// --- part 11 ---
module nut_washer() {
  difference() {
      translate([0, 0, 0]) cylinder(h = 1.6, d = 20);
      translate([0, 0, -1]) cylinder(h = 3.6, d = 10.8);
    }
}

// --- part 12 ---
module press_nut() {
  difference() {
    linear_extrude(height = 8) polygon(points = [[9.238, 0], [4.619, 8], [-4.619, 8], [-9.238, 0], [-4.619, -8], [4.619, -8]]);
    translate([0, 0, -1]) cylinder(h = 10, d = 10.8);
  }
}

// --- assembly ---
module assembly() {
  color([0.80, 0.24, 0.20]) translate([0, 0, 0]) rotate([0, 0, 0]) press_bed();
  color([0.20, 0.45, 0.75]) translate([0, 0, 12.25]) rotate([0, 0, 0]) anvil_block();
  color([0.25, 0.62, 0.32]) translate([44, 24, 12.25]) rotate([0, 0, 0]) press_post_a();
  color([0.92, 0.70, 0.18]) translate([44, -24, 12.25]) rotate([0, 0, 0]) press_post_b();
  color([0.58, 0.35, 0.70]) translate([-44, 24, 12.25]) rotate([0, 0, 0]) press_post_c();
  color([0.16, 0.66, 0.66]) translate([-44, -24, 12.25]) rotate([0, 0, 0]) press_post_d();
  color([0.85, 0.48, 0.18]) translate([0, 0, 92.5]) rotate([0, 0, 0]) press_frame();
  color([0.55, 0.60, 0.65]) translate([0, 0, 104.75]) rotate([0, 0, 0]) guide_ring();
  color([0.75, 0.30, 0.55]) translate([0, 0, 88.55]) rotate([0, 0, 0]) press_screw();
  color([0.42, 0.52, 0.28]) translate([0, 0, 46.25]) rotate([0, 0, 0]) press_head();
  color([0.80, 0.24, 0.20]) translate([0, 0, 121]) rotate([0, 0, 0]) nut_washer();
  color([0.20, 0.45, 0.75]) translate([0, 0, 122.85]) rotate([0, 0, 0]) press_nut();
}

assembly();
